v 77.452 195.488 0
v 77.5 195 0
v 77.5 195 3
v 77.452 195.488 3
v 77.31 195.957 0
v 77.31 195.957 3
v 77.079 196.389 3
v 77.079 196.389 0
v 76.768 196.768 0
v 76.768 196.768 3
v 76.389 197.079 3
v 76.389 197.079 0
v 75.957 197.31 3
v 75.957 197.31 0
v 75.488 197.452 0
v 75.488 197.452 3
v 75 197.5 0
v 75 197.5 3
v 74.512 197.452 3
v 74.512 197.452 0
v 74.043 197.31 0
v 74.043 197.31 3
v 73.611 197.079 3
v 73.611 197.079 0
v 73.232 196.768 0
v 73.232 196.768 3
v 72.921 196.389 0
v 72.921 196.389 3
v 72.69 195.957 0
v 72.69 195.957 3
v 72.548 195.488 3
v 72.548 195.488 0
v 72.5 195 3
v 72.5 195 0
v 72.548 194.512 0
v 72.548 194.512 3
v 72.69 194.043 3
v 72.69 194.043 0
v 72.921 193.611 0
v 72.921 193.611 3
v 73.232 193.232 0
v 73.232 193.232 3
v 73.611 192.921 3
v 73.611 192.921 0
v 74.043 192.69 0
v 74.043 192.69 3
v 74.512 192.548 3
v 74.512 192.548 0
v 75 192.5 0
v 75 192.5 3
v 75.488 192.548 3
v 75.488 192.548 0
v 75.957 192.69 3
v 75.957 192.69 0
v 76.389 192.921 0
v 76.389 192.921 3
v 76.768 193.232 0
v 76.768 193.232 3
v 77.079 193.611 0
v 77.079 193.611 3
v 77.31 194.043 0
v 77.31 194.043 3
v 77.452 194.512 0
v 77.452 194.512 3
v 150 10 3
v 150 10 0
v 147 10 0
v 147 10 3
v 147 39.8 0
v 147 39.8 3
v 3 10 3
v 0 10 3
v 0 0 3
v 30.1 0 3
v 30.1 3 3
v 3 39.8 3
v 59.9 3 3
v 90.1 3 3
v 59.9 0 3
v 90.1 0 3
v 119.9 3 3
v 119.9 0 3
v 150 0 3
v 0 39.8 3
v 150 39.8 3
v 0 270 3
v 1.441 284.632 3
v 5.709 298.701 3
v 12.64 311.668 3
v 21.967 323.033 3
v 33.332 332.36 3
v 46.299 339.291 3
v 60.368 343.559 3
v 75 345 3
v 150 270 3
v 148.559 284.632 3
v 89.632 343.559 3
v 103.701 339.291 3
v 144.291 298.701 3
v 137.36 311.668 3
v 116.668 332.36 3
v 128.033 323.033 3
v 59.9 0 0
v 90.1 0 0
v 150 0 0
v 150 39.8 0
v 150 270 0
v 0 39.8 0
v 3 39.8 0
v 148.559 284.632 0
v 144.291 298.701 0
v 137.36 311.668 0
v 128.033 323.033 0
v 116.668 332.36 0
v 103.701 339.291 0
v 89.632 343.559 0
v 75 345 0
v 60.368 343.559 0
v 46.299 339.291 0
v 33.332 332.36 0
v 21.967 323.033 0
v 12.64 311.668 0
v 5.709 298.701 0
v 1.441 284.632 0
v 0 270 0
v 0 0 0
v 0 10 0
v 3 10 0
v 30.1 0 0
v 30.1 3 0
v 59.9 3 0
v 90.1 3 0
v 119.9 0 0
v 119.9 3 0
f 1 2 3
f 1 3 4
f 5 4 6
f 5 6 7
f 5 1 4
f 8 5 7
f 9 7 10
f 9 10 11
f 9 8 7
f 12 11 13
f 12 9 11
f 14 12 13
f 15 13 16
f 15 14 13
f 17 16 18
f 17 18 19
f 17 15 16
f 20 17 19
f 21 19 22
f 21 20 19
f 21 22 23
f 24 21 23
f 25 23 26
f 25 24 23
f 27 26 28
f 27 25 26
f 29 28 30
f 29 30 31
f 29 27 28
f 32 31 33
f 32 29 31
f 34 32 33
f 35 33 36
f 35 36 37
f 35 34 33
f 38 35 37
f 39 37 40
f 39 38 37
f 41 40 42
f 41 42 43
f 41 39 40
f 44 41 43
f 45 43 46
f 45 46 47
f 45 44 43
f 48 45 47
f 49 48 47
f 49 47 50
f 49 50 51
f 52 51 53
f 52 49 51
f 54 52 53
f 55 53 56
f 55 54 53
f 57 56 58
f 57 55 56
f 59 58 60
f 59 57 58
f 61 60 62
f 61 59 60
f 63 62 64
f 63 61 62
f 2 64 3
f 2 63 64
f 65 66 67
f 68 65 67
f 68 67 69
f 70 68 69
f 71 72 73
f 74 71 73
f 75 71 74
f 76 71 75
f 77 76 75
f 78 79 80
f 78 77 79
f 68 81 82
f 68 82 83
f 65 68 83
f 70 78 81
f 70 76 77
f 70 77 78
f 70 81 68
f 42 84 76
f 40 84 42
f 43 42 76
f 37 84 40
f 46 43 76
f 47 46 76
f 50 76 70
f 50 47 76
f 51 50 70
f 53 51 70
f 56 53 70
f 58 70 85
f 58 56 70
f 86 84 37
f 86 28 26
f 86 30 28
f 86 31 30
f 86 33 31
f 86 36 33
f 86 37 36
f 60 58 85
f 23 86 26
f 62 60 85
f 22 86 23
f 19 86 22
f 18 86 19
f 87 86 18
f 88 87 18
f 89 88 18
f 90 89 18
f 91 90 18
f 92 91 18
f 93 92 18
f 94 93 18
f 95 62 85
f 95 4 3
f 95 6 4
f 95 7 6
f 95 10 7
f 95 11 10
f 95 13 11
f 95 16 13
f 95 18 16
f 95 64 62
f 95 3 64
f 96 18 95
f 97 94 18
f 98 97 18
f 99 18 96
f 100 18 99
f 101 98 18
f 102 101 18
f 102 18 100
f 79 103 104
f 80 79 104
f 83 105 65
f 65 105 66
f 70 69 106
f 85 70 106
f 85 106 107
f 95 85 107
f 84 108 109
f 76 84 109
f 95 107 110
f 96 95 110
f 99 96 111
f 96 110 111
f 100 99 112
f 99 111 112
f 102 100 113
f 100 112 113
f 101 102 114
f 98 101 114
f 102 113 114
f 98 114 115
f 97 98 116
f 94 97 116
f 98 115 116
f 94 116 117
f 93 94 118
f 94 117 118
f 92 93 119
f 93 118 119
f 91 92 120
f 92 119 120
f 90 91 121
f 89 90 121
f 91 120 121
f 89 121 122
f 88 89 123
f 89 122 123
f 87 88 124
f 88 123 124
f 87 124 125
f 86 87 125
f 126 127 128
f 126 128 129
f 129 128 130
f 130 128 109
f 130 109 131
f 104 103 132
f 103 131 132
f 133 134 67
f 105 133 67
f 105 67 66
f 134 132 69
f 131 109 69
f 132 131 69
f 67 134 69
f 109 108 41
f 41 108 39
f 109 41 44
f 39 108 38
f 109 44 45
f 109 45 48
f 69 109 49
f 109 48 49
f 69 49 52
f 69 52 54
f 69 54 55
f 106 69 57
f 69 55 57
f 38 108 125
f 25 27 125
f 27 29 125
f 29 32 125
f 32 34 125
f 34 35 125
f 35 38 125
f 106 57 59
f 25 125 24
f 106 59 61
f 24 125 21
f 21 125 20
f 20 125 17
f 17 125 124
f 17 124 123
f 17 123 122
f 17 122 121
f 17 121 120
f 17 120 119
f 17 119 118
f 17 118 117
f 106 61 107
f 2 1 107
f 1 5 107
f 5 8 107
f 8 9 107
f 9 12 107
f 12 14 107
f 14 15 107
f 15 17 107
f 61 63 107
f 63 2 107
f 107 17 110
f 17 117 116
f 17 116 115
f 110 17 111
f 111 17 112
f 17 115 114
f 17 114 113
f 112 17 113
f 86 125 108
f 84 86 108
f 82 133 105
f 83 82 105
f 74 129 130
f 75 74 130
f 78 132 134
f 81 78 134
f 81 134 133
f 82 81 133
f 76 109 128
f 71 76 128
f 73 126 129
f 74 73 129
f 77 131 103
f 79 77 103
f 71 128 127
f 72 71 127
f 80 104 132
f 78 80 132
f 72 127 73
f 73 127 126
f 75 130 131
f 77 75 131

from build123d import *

# Parameters (mm, degrees)
SKETCH1_R           = 2.5
BOSS_EXTRUDE1_DEPTH = 3


with BuildPart() as part:
    # Sketch1 → Boss-Extrude1 (new body)
    with BuildSketch(Plane.XY):
        with BuildLine():
            Line((59.9, 0), (90.1, 0))
            Line((90.1, 0), (90.1, 3))
            Line((90.1, 3), (119.9, 3))
            Line((119.9, 3), (119.9, 0))
            Line((119.9, 0), (150, 0))
            Line((150, 0), (150, 10))
            Line((150, 10), (147, 10))
            Line((147, 10), (147, 39.8))
            Line((147, 39.8), (150, 39.8))
            Line((150, 39.8), (150, 270))
            ThreePointArc((150, 270), (75, 345), (0, 270))
            Line((0, 270), (0, 39.8))
            Line((0, 39.8), (3, 39.8))
            Line((3, 39.8), (3, 10))
            Line((3, 10), (0, 10))
            Line((0, 10), (0, 0))
            Line((0, 0), (30.1, 0))
            Line((30.1, 0), (30.1, 3))
            Line((30.1, 3), (59.9, 3))
            Line((59.9, 3), (59.9, 0))
        make_face()
        with Locations((75, 195)):
            Circle(SKETCH1_R, mode=Mode.SUBTRACT)
    extrude(amount=BOSS_EXTRUDE1_DEPTH)


solid = part.part
